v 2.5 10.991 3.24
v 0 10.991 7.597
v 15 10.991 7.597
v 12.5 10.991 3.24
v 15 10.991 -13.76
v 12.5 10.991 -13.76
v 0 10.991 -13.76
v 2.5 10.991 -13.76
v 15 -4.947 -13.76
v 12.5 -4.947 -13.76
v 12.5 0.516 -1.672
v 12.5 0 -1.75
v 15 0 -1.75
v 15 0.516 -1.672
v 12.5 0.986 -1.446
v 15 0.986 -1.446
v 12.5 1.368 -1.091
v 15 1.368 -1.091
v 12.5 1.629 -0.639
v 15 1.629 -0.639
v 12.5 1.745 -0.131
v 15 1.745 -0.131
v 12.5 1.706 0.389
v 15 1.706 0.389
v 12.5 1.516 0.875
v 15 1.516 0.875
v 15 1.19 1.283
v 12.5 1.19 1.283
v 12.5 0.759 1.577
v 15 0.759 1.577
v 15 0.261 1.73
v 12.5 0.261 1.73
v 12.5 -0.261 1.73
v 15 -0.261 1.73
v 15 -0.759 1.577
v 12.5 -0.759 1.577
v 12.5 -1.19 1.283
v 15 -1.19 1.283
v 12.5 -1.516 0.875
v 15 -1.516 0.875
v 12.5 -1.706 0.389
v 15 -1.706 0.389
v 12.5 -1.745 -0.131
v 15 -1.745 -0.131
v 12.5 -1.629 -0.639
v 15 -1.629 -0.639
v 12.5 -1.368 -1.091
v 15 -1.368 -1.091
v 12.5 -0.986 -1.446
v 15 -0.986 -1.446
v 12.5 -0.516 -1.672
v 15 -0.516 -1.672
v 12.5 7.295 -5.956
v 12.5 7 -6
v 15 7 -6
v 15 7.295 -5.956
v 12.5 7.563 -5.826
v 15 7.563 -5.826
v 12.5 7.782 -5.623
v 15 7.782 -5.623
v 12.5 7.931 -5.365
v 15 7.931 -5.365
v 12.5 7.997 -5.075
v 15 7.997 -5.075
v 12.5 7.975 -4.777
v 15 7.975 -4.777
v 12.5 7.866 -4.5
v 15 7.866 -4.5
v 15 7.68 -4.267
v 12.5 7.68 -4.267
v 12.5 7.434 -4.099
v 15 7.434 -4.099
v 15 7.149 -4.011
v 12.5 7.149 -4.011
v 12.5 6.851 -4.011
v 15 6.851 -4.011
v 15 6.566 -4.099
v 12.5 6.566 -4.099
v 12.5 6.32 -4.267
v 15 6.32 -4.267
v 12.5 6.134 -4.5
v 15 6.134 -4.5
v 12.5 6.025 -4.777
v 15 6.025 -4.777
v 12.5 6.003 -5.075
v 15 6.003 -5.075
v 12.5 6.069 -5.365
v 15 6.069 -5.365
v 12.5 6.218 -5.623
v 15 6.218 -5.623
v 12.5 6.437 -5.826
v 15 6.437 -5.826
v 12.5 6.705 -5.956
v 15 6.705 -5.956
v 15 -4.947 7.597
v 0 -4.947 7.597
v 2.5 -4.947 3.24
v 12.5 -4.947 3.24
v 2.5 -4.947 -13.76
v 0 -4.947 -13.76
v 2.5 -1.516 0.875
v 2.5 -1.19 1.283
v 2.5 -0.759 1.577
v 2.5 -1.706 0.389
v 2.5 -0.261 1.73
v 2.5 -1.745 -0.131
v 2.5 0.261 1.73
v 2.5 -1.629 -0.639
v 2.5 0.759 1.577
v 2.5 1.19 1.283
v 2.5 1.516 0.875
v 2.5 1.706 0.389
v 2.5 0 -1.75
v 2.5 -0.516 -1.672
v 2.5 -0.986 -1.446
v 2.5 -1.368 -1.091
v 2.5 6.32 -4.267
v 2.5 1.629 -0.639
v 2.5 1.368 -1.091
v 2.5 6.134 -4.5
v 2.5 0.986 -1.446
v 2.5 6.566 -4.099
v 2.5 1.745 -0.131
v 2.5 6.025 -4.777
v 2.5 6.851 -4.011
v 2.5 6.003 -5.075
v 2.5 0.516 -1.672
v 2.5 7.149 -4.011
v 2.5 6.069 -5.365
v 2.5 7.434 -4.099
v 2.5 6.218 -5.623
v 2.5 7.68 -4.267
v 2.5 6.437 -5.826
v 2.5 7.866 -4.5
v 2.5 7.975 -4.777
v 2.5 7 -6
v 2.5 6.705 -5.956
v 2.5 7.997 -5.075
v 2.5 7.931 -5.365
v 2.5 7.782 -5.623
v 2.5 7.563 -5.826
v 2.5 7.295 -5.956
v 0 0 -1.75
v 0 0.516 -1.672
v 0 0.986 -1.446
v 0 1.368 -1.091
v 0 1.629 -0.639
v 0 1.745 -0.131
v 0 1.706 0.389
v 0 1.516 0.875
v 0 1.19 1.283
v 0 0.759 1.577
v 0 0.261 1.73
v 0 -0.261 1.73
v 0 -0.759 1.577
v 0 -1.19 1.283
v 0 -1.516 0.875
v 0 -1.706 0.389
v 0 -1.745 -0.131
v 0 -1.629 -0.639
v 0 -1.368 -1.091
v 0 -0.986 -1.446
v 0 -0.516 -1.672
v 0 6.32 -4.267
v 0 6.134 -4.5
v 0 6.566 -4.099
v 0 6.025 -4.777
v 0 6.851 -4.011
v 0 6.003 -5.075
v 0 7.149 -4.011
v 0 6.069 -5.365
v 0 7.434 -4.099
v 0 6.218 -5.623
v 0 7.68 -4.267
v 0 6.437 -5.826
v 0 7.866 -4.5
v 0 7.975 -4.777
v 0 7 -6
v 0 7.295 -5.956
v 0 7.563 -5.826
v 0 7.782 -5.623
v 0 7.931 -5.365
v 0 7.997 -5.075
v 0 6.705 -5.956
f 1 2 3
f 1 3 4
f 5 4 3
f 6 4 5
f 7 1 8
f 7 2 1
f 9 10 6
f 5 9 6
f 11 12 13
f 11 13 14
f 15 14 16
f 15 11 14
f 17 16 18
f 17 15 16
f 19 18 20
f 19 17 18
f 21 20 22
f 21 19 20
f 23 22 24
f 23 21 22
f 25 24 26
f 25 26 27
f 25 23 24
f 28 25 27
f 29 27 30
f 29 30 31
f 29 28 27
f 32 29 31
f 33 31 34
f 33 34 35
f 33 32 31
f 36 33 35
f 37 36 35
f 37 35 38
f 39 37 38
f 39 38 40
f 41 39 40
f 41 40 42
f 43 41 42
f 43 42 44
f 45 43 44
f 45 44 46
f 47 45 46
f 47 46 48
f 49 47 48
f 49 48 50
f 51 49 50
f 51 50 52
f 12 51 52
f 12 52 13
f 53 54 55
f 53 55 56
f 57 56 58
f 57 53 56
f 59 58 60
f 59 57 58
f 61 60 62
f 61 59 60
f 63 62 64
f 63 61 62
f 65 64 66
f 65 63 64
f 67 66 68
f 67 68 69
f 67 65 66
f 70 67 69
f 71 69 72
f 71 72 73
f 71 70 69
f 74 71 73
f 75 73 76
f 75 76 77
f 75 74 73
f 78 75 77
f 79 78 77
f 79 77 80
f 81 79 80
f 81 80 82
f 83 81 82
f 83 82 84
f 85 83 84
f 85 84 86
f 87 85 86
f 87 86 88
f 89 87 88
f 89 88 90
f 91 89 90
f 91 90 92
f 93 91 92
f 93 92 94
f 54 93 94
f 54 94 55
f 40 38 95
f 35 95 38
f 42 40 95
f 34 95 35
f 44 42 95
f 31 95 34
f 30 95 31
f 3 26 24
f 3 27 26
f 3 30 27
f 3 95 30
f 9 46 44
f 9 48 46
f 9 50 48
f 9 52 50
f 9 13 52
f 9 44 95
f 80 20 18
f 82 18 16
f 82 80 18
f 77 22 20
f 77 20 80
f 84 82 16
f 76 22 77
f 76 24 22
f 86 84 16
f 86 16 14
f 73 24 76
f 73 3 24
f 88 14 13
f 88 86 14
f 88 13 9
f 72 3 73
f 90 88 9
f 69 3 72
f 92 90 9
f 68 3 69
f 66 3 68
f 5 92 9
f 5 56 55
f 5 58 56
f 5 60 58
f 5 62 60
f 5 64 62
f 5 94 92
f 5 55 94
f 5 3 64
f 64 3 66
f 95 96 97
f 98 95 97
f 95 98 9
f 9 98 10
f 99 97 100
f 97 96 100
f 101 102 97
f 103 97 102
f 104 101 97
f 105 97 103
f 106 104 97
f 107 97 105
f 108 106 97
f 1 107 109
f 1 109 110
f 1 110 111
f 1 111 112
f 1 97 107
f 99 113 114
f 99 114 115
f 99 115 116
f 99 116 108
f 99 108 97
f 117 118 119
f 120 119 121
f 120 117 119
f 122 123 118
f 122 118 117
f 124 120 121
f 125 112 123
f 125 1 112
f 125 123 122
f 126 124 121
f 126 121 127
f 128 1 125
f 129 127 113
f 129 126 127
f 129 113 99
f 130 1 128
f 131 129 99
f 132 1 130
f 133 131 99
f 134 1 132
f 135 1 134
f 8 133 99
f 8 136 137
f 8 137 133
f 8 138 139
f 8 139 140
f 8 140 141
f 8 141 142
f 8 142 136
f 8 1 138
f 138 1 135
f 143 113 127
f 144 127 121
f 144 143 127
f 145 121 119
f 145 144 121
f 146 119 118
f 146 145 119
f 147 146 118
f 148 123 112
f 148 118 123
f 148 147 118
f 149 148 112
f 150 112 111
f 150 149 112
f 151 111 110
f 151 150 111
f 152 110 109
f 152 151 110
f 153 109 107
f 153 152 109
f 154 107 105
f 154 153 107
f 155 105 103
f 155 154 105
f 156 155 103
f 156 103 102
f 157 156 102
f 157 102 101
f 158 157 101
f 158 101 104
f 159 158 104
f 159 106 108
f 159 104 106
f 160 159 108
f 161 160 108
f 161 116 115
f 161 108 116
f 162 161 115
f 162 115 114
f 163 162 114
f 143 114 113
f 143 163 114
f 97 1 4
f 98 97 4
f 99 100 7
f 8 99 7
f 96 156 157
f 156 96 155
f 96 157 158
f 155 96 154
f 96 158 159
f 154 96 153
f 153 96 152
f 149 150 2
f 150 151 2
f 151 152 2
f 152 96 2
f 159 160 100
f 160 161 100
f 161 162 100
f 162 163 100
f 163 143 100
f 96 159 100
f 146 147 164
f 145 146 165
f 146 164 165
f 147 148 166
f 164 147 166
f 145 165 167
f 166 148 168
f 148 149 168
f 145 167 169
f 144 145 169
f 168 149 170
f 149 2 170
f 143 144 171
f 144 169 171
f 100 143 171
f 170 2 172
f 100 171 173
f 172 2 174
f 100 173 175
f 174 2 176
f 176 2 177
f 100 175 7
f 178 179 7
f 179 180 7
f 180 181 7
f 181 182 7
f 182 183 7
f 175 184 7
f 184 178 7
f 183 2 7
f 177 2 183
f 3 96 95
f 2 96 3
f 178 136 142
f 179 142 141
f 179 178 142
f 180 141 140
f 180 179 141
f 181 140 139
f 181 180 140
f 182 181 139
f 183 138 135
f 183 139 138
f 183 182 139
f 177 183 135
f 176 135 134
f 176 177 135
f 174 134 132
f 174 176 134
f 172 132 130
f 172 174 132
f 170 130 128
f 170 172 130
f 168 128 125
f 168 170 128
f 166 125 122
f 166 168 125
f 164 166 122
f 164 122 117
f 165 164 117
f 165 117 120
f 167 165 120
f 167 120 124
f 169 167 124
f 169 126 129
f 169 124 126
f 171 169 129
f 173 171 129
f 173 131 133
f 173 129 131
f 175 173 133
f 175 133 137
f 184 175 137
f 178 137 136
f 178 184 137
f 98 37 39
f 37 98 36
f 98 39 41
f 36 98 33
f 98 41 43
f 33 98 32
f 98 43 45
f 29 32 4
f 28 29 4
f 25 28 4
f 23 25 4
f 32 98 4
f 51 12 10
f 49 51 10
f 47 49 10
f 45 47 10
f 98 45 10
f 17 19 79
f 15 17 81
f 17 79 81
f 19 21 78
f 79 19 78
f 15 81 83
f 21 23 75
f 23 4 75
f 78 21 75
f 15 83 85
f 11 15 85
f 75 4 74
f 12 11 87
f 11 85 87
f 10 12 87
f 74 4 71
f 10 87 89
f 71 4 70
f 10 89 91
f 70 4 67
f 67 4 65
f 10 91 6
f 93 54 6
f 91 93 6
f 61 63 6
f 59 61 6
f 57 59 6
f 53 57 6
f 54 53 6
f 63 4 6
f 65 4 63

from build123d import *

# Parameters (mm, degrees)
SKETCH1_W           = 21.356696791
SKETCH1_H           = 15.93739856
SKETCH1_R           = 1.75
SKETCH1_R_2         = 1
BOSS_EXTRUDE1_DEPTH = 15
CUT_EXTRUDE1_REACH  = 17.937
SKETCH2_W           = 10
SKETCH2_H           = 17


with BuildPart() as part:
    # Sketch1 → Boss-Extrude1 (new body)
    with BuildSketch(Plane(origin=(0, 0, 0), x_dir=(0, 0, -1), z_dir=(1, 0, 0))):
        with Locations((3.081269675, 3.021892184)):
            Rectangle(SKETCH1_W, SKETCH1_H)
        Circle(SKETCH1_R, mode=Mode.SUBTRACT)
        with Locations((5, 7)):
            Circle(SKETCH1_R_2, mode=Mode.SUBTRACT)
    extrude(amount=BOSS_EXTRUDE1_DEPTH)

    # Sketch2 → Cut-Extrude1 (cut, up to next)
    with BuildSketch(Plane(origin=(0, 10.990591464, 0), x_dir=(1, 0, 0), z_dir=(0, 1, 0)), mode=Mode.PRIVATE) as cut_extrude1_sk1:
        with Locations((7.5, 5.259618071)):
            Rectangle(SKETCH2_W, SKETCH2_H)
    cut_extrude1_tool1 = extrude(cut_extrude1_sk1.sketch, amount=-CUT_EXTRUDE1_REACH, mode=Mode.PRIVATE) & part.part
    add(cut_extrude1_tool1.solids().sort_by_distance((7.5, 10.990591, -5.259618))[0], mode=Mode.SUBTRACT)


solid = part.part
